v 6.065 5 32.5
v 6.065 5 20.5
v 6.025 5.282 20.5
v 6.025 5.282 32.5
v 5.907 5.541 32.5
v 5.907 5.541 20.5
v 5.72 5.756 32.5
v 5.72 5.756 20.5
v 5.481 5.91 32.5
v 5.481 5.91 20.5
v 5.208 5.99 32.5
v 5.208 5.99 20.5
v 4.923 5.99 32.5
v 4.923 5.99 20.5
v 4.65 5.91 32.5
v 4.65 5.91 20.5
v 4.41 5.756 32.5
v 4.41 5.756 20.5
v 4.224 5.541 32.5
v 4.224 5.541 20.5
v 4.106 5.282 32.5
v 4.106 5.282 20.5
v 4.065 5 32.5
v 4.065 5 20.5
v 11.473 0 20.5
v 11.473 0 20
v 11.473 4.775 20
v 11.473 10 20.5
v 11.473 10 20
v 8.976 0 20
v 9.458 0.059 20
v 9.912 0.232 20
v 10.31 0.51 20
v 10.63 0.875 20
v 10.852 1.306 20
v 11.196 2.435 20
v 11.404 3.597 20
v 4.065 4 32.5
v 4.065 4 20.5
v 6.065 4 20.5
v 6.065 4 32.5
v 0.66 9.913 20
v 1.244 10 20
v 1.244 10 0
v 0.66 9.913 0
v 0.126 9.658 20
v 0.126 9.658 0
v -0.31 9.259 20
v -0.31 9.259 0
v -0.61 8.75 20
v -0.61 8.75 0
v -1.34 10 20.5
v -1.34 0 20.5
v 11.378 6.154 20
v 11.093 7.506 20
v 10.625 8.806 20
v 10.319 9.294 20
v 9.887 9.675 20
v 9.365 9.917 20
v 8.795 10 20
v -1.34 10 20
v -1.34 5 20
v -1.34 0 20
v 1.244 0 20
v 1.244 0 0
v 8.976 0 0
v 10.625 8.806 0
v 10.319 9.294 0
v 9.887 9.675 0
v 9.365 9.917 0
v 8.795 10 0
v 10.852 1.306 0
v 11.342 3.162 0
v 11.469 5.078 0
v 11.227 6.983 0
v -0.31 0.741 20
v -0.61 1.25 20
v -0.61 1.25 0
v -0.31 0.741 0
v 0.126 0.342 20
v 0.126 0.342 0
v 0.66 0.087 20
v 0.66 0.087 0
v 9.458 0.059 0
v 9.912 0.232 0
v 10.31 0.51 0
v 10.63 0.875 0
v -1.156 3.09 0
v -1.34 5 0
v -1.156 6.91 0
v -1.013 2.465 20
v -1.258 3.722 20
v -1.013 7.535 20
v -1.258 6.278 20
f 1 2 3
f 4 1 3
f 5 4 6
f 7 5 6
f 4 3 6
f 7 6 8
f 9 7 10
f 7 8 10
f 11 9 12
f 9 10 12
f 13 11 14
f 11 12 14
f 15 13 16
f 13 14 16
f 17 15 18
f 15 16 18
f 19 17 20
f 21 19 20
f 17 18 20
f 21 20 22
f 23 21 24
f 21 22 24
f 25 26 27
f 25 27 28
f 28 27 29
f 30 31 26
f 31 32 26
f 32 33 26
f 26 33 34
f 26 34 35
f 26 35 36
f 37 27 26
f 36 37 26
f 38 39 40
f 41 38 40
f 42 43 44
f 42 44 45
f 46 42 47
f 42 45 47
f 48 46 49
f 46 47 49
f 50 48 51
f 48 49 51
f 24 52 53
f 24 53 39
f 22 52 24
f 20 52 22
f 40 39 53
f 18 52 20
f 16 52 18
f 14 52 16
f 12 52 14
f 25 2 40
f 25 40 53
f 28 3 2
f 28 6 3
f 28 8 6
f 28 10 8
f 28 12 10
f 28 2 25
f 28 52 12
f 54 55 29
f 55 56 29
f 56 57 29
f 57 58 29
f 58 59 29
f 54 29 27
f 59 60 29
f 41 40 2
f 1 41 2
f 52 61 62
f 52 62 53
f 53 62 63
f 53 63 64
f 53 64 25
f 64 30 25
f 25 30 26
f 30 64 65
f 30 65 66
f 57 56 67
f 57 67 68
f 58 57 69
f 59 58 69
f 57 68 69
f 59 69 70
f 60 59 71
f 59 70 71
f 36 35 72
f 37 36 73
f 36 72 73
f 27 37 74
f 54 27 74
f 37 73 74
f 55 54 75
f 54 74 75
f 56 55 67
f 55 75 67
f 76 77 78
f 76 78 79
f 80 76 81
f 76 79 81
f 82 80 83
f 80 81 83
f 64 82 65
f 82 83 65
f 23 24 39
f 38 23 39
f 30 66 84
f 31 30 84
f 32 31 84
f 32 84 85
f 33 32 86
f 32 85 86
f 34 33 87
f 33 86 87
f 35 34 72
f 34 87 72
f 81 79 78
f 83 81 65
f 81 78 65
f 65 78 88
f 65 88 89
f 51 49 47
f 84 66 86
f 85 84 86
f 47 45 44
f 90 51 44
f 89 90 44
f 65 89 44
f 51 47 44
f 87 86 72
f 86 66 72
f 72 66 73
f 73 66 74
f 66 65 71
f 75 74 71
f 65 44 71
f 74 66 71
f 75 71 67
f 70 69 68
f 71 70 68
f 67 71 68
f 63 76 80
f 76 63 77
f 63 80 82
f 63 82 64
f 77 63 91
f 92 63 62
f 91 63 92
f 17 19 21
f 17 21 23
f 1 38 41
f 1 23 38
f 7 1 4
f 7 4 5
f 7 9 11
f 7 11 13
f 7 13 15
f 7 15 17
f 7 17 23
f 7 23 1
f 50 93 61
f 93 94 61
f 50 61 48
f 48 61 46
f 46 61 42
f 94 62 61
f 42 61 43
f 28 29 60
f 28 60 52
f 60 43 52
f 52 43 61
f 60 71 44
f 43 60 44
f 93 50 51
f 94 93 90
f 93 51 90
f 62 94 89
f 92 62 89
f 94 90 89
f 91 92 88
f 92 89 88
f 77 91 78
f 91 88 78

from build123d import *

# Parameters (mm, degrees)
BOSS_EXTRUDE1_DEPTH = 20
BOSS_EXTRUDE2_DEPTH = 0.5
BOSS_EXTRUDE3_DEPTH = 12


with BuildPart() as part:
    # Sketch1 → Boss-Extrude1 (new body)
    with BuildSketch(Plane.XY):
        with BuildLine():
            Line((1.244055551, 0), (8.976470711, 0))
            ThreePointArc((8.976470711, 0), (10.119336086, 0.358702119), (10.85225323, 1.306141266))
            ThreePointArc((10.85225323, 1.306141266), (11.468754399, 5.078261149), (10.62502936, 8.806141266))
            ThreePointArc((10.62502936, 8.806141266), (9.887330043, 9.675154102), (8.794691615, 10))
            Line((8.794691615, 10), (1.244055551, 10))
            ThreePointArc((1.244055551, 10), (0.126021562, 9.658312395), (-0.609994071, 8.75))
            ThreePointArc((-0.609994071, 8.75), (-1.339745962, 5), (-0.609994071, 1.25))
            ThreePointArc((-0.609994071, 1.25), (0.126021562, 0.341687605), (1.244055551, 0))
        make_face()
    extrude(amount=BOSS_EXTRUDE1_DEPTH)

    # Sketch3 → Boss-Extrude2 (add)
    with BuildSketch(Plane.XY.offset(20)):
        Polygon((-1.339745962, 5), (-1.339745962, 0), (11.473340637, 0), (11.473340637, 4.775434937), (11.473340637, 10), (-1.339745962, 10), align=None)
    extrude(amount=BOSS_EXTRUDE2_DEPTH)

    # Sketch4 → Boss-Extrude3 (add)
    with BuildSketch(Plane.XY.offset(20.5)):
        with BuildLine():
            Line((4.065254038, 4), (6.065254038, 4))
            Line((6.065254038, 4), (6.065254038, 5))
            ThreePointArc((6.065254038, 5), (5.065254038, 6), (4.065254038, 5))
            Line((4.065254038, 5), (4.065254038, 4))
        make_face()
    extrude(amount=BOSS_EXTRUDE3_DEPTH)


solid = part.part
